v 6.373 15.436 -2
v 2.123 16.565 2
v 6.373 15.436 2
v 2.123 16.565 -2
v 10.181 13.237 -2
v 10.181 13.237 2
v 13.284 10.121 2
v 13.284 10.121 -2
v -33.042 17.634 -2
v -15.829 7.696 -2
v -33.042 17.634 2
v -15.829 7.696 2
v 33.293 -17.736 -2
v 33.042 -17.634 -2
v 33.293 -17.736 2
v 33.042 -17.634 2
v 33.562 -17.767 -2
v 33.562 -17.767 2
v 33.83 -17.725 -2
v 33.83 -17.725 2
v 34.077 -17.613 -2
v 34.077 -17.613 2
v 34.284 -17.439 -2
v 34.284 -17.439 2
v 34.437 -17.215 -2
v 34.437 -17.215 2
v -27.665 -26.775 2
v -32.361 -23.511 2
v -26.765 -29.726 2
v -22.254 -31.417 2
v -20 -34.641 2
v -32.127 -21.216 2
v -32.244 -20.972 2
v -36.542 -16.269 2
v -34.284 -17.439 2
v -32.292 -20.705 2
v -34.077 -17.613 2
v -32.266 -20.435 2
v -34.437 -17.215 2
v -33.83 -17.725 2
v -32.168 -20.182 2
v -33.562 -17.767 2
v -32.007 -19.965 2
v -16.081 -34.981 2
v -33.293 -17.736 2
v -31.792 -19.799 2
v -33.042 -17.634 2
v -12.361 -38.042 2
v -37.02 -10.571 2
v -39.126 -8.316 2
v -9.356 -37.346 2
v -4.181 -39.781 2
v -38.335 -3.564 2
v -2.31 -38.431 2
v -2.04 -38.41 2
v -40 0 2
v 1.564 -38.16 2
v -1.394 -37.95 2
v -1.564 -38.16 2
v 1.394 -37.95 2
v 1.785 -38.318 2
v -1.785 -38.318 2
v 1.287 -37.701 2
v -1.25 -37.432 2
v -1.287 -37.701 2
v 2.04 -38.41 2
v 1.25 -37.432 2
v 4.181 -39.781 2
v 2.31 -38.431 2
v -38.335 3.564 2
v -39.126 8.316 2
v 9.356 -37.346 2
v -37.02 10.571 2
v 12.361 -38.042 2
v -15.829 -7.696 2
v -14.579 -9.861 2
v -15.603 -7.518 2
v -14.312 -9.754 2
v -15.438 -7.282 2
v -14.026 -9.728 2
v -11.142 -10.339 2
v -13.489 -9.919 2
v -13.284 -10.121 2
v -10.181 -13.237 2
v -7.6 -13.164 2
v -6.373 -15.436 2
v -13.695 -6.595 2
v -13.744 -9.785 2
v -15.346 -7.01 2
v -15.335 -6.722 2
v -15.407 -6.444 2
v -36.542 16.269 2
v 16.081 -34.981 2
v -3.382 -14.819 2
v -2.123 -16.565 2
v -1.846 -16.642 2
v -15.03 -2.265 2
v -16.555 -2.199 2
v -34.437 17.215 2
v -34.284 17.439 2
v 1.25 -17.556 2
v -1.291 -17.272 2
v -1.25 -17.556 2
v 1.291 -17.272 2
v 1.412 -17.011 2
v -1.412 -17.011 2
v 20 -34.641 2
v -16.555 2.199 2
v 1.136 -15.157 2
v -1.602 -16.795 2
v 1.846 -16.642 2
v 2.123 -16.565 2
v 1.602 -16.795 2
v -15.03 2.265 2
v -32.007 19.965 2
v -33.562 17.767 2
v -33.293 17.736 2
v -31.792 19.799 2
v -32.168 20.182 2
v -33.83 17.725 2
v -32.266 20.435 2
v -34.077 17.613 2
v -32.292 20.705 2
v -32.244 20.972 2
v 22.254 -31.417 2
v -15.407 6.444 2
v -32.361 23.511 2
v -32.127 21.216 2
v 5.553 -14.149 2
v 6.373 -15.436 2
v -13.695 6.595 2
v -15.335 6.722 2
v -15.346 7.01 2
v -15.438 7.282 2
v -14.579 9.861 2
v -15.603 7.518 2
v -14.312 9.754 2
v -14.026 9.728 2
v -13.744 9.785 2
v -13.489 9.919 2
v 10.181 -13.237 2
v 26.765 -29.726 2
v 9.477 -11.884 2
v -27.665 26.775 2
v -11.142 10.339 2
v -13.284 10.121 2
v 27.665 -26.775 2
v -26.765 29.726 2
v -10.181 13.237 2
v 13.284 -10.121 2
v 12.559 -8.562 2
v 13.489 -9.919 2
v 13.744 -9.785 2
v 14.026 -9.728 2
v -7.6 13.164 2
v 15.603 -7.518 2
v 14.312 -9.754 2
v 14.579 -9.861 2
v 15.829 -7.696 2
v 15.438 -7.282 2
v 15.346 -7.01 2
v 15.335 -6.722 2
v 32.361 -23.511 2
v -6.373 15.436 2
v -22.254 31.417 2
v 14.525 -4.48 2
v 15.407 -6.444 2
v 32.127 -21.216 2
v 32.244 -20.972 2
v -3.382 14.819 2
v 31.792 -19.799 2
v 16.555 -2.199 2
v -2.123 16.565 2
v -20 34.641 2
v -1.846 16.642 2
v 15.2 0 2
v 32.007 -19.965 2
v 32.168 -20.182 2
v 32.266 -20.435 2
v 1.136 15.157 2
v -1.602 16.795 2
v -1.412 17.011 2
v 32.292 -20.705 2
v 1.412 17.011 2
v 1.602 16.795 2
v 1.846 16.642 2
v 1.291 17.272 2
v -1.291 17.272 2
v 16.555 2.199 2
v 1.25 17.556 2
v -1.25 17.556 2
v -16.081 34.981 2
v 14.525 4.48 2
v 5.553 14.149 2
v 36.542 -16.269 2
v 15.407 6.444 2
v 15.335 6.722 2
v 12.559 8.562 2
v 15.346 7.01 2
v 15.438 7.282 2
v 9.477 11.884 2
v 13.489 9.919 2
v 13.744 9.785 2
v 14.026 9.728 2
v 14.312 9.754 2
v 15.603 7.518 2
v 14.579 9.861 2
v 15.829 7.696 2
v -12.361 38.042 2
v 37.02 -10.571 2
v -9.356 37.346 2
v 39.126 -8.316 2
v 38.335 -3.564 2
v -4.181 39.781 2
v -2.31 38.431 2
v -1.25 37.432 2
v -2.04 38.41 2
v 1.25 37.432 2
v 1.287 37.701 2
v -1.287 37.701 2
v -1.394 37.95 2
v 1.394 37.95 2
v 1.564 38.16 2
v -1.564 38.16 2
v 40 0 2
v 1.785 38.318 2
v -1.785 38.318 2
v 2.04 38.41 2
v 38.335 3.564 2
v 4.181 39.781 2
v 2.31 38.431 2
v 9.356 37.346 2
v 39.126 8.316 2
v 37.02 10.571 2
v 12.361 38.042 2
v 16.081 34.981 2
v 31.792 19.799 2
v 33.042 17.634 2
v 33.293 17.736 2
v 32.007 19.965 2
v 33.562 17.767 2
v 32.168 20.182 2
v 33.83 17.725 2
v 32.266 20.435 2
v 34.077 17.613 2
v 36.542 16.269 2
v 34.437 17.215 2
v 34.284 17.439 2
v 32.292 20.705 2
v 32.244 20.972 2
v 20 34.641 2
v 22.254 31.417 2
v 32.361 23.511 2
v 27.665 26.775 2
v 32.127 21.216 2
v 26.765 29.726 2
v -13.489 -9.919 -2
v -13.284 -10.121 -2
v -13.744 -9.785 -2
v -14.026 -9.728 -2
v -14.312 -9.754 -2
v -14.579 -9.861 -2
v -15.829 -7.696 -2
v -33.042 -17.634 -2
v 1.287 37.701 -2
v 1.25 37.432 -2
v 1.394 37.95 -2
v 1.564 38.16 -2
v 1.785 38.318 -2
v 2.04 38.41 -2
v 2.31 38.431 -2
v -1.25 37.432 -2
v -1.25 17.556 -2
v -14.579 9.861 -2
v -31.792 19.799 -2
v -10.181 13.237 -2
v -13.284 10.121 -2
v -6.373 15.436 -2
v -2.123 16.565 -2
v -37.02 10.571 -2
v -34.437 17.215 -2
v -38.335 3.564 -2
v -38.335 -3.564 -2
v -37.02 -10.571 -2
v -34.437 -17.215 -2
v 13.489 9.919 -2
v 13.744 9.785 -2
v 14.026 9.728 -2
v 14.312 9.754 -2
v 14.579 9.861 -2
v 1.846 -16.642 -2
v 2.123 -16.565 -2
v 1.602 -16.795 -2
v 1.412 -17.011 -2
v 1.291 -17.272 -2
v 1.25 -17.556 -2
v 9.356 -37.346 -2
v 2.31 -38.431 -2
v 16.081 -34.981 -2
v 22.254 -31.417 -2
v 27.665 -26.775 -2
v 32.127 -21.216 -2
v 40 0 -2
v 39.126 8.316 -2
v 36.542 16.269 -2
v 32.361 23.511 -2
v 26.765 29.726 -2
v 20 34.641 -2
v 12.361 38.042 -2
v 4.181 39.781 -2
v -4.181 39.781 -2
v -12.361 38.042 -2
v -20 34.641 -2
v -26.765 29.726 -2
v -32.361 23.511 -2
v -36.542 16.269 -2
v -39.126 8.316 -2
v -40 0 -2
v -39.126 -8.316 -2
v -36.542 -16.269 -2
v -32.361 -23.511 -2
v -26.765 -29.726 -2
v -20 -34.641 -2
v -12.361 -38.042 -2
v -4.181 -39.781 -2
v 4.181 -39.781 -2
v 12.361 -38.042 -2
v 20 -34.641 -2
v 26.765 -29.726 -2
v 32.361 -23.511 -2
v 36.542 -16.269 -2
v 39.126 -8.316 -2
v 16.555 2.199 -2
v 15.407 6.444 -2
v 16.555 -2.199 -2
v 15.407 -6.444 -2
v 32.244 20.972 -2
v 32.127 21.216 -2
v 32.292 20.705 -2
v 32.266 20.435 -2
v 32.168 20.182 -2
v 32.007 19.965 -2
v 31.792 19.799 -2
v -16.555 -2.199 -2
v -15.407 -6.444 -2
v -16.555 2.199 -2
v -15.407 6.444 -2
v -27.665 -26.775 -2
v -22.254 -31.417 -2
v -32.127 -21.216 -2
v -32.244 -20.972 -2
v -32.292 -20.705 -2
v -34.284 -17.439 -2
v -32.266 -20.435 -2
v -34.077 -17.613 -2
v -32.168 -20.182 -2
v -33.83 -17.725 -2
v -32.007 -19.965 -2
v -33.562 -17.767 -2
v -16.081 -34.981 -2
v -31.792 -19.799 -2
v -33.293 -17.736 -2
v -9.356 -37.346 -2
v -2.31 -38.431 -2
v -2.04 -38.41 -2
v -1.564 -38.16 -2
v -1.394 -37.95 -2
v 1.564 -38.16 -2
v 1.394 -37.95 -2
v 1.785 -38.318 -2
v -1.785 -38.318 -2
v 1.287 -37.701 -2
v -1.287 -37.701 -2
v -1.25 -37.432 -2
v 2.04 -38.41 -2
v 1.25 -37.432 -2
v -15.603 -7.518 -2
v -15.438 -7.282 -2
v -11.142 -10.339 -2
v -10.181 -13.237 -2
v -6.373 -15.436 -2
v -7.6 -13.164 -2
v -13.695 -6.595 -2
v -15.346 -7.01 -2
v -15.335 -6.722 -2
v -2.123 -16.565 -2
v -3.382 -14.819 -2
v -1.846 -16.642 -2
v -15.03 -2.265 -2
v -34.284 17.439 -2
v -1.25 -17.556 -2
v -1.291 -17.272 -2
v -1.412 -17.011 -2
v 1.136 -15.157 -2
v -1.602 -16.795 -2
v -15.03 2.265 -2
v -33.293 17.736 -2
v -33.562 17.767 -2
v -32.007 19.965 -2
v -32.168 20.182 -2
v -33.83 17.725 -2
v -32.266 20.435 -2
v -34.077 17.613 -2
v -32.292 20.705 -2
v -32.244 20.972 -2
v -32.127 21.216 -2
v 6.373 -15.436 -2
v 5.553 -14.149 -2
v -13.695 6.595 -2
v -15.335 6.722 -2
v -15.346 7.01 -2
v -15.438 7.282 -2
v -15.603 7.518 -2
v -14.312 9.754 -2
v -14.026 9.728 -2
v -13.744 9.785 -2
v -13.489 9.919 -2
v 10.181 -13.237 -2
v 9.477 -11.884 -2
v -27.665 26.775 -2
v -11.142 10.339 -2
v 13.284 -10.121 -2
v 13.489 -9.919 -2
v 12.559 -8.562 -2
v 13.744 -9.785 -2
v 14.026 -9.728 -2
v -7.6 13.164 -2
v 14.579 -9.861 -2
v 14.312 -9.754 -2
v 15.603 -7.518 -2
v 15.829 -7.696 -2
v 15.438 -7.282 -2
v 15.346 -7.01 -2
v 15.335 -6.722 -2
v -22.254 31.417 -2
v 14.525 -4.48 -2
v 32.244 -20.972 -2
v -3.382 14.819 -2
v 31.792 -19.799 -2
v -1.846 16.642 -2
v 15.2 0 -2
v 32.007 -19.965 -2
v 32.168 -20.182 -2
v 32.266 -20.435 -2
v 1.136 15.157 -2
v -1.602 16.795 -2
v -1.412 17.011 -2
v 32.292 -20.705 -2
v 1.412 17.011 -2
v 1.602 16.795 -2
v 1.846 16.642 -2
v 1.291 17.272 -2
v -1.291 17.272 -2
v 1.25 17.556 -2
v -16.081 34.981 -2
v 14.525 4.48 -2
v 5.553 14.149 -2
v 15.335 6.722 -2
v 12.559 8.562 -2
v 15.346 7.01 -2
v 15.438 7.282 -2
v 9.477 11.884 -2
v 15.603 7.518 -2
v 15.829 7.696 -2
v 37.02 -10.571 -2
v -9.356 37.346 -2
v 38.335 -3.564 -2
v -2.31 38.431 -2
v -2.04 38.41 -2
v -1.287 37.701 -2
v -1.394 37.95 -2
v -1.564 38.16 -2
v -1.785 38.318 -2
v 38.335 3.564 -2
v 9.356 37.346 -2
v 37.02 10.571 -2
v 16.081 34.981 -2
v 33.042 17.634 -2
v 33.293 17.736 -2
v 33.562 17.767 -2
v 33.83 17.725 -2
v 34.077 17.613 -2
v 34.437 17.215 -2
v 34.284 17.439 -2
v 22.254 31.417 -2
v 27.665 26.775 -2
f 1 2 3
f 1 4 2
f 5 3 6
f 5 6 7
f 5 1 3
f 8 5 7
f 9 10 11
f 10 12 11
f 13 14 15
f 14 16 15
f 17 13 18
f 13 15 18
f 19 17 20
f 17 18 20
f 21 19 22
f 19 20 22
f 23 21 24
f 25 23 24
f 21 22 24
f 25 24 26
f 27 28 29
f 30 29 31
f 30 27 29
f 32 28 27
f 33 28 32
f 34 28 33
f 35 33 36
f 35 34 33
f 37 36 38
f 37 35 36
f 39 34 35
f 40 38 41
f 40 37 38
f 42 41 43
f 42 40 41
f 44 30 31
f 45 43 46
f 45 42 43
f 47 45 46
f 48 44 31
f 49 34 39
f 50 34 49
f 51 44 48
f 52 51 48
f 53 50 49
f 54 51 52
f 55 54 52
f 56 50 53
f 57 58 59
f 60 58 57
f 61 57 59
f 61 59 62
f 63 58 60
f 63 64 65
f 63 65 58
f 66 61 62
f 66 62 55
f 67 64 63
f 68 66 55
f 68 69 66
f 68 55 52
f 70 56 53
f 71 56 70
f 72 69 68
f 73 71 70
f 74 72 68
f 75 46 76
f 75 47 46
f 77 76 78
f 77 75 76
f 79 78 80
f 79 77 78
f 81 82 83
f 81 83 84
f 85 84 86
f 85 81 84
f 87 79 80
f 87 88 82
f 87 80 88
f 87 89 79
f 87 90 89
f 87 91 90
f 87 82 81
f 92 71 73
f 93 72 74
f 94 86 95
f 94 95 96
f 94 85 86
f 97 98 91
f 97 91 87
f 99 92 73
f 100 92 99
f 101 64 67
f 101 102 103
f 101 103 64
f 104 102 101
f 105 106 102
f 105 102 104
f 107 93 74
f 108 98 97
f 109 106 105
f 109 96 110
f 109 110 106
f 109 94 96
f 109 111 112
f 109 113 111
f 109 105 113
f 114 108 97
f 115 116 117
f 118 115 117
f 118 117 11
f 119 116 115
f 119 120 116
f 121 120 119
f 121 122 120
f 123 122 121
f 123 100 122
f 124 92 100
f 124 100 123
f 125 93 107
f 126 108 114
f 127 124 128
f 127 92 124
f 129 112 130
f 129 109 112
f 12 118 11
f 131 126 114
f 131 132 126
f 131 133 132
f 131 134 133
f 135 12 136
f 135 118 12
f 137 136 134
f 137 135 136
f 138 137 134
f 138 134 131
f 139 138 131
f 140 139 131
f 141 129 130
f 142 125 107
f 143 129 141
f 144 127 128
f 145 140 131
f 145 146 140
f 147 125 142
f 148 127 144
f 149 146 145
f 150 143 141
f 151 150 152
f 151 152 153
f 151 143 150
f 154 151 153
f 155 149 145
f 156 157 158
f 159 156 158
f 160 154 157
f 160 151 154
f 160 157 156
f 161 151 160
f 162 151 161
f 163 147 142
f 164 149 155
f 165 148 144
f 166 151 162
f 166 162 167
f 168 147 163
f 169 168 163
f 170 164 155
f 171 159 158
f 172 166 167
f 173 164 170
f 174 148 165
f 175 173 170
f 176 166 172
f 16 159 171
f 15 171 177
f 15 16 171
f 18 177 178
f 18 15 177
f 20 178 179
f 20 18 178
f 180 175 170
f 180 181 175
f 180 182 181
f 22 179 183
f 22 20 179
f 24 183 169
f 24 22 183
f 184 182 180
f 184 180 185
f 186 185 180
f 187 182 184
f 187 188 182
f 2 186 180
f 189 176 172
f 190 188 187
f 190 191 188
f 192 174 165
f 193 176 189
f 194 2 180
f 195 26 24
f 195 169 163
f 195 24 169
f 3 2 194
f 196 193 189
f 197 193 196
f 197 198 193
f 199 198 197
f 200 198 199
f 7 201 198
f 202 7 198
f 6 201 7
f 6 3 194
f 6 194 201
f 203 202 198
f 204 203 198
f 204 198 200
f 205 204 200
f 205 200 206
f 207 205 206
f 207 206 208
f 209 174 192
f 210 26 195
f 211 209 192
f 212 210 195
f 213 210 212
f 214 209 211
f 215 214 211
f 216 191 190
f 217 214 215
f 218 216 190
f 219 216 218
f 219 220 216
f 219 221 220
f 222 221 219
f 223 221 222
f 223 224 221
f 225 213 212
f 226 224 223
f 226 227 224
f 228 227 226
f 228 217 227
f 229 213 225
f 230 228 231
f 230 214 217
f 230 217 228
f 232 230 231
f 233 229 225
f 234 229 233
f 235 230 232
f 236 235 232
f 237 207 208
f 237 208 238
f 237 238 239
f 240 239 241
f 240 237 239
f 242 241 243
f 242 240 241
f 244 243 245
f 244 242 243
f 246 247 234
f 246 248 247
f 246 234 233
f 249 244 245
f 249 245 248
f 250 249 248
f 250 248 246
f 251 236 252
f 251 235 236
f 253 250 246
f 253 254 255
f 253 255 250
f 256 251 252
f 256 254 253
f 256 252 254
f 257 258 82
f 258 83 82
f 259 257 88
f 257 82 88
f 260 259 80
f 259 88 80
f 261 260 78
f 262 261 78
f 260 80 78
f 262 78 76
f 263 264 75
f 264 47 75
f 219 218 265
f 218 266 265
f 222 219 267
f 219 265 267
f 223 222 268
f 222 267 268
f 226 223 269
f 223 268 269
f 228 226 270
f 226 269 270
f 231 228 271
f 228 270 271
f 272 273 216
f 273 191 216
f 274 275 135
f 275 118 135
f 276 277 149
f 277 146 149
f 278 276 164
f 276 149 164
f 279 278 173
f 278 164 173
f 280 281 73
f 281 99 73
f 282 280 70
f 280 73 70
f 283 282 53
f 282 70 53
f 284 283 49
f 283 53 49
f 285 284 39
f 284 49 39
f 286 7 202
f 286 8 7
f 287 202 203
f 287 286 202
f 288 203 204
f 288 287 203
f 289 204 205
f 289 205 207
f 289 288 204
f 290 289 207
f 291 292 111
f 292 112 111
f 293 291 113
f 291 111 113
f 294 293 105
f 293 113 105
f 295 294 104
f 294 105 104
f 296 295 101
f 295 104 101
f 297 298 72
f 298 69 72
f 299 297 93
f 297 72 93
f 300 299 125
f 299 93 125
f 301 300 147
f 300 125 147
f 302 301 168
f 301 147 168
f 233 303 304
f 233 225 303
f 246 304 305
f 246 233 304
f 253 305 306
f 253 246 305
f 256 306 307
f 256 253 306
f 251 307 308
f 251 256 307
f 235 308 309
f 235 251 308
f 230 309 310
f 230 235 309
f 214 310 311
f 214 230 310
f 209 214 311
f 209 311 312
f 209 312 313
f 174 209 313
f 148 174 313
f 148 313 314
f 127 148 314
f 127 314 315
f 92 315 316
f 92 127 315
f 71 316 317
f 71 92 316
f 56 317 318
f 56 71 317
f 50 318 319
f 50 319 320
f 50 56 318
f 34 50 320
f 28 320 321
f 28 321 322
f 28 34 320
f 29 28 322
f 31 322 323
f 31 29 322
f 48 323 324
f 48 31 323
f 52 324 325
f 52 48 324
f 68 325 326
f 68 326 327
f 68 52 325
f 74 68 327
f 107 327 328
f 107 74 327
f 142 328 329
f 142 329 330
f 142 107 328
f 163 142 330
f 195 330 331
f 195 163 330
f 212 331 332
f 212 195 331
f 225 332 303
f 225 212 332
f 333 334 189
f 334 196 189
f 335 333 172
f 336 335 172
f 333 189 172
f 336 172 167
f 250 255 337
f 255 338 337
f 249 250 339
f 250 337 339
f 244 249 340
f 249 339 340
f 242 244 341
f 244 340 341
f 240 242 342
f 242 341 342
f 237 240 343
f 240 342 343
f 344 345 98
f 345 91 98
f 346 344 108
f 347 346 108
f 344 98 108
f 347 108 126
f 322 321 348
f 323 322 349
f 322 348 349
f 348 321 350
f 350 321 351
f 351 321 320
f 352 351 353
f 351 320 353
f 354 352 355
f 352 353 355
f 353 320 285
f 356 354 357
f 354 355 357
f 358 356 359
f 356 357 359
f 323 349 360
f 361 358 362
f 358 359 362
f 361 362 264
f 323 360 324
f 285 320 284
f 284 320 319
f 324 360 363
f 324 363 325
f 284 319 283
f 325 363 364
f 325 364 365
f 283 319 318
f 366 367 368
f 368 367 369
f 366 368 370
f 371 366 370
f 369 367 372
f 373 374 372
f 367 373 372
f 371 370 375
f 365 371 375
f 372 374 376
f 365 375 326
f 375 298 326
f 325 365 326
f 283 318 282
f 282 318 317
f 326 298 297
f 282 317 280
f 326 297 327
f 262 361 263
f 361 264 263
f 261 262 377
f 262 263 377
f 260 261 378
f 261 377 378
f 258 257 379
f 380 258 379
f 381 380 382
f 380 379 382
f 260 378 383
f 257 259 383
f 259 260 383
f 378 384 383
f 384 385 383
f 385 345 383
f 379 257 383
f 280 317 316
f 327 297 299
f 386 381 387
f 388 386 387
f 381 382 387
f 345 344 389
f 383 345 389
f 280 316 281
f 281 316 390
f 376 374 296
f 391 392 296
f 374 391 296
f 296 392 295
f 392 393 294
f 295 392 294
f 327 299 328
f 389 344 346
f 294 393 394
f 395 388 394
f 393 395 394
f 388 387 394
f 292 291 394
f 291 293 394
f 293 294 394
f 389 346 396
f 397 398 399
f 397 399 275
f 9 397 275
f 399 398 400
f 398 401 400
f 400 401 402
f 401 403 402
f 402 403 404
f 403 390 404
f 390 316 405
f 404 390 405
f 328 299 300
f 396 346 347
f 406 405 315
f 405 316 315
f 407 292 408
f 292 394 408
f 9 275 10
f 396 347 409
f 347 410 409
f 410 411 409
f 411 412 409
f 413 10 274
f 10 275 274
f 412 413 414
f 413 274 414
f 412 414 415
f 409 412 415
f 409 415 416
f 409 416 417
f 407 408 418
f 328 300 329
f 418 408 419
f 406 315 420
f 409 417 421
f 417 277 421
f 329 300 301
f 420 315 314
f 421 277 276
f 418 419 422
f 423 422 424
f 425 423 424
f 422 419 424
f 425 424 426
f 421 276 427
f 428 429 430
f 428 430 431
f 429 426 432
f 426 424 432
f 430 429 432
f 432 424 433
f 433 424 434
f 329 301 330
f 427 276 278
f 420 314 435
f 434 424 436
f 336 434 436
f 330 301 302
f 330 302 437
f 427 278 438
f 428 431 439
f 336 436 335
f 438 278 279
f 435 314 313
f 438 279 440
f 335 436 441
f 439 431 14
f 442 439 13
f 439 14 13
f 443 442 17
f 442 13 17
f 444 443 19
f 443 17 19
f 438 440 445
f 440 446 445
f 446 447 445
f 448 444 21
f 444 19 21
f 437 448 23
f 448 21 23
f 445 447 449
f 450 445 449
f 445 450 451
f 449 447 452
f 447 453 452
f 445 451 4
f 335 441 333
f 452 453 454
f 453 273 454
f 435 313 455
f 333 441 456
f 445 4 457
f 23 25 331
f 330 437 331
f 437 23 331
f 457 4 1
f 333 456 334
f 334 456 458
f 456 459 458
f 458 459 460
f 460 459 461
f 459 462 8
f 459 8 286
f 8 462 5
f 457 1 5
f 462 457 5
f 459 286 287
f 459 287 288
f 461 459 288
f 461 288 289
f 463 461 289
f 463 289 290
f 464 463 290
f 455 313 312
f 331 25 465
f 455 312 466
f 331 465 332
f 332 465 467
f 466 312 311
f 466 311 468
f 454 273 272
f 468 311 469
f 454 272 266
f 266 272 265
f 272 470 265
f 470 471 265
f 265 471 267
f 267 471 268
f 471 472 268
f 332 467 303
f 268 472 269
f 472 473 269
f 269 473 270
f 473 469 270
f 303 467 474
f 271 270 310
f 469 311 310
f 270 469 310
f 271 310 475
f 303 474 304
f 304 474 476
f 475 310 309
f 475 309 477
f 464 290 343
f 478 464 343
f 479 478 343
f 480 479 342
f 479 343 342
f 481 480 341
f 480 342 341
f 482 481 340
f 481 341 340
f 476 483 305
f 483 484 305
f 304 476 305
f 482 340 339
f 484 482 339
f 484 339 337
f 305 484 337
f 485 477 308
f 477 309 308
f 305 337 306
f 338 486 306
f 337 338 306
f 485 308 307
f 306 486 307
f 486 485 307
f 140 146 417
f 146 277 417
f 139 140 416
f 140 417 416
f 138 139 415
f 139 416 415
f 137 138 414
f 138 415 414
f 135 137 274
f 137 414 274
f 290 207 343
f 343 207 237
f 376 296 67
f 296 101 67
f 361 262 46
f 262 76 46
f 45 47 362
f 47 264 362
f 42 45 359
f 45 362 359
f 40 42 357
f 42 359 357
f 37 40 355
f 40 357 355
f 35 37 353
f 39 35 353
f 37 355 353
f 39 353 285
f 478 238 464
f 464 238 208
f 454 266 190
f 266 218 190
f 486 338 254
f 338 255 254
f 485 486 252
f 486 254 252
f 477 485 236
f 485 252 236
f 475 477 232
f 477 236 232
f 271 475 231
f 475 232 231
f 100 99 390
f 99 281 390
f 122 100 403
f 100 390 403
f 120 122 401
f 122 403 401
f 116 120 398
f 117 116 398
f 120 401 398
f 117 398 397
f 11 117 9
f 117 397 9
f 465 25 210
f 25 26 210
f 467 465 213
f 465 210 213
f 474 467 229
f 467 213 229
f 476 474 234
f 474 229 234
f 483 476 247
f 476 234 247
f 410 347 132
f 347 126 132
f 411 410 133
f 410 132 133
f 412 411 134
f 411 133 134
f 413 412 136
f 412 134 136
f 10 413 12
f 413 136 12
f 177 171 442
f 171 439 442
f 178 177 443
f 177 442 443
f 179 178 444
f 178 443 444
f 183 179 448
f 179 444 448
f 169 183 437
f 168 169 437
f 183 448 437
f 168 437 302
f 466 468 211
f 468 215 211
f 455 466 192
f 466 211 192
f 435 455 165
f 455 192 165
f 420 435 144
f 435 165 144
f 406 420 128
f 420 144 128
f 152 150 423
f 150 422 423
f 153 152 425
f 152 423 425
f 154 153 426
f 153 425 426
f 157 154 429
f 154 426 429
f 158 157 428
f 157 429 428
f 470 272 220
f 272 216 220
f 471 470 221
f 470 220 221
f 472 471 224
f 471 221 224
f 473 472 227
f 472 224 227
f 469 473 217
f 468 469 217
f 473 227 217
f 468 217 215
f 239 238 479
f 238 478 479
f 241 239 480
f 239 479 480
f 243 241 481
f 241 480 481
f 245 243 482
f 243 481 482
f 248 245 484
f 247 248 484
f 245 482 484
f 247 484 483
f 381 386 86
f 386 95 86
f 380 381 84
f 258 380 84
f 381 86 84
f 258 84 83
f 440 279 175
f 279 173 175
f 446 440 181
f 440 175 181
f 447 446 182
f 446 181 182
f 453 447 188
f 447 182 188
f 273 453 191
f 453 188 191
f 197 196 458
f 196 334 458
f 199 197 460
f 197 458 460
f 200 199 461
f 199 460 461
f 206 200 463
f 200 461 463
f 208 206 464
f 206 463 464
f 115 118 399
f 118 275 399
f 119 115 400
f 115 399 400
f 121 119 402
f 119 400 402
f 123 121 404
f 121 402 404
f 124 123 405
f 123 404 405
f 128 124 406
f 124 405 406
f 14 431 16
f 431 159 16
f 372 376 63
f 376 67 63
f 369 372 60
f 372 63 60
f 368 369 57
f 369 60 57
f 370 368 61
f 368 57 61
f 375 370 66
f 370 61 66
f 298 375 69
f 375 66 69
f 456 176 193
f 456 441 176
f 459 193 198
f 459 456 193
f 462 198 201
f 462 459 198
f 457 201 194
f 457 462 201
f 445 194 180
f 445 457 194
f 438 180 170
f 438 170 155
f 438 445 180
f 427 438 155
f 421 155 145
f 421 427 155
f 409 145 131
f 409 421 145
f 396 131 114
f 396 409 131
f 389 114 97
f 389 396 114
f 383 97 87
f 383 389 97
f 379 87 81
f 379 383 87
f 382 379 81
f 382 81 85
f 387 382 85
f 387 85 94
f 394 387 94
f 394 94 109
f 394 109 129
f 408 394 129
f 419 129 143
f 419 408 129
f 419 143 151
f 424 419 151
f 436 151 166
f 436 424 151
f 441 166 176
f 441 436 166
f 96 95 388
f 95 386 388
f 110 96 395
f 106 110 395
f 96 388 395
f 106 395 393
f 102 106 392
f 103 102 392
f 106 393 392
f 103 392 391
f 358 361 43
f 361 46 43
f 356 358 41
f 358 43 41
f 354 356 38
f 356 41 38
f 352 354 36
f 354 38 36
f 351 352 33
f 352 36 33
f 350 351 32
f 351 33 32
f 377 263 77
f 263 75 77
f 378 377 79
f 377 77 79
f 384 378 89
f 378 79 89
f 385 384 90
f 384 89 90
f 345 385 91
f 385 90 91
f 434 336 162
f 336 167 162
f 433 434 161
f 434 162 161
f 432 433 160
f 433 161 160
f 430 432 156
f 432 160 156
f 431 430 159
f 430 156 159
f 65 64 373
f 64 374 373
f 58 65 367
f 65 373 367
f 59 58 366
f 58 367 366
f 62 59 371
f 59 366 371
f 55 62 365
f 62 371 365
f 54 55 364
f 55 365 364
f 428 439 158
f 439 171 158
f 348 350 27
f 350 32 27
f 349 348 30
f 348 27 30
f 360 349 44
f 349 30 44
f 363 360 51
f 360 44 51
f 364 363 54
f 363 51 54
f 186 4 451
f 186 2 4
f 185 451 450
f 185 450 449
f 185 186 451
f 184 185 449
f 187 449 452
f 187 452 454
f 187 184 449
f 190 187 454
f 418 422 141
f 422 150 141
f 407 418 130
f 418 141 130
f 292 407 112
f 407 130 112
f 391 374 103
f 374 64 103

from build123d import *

# Parameters (mm, degrees)
SKETCH1_R           = 40
SKETCH1_R_2         = 15.2
BOSS_EXTRUDE1_DEPTH = 2
FILLET2_R           = 1


with BuildPart() as part:
    # Sketch1 → Boss-Extrude1 (new, symmetric)
    with BuildSketch(Plane.XY):
        Circle(SKETCH1_R)
        Circle(SKETCH1_R_2, mode=Mode.SUBTRACT)
        with BuildLine():
            ThreePointArc((1.25, -38.479702442), (19.25, -33.341978046), (32.699399845, -20.322382976))
            Line((32.699399845, -20.322382976), (13.797053425, -9.409108182))
            ThreePointArc((13.797053425, -9.409108182), (8.35, -14.462624243), (1.25, -16.653152855))
            Line((1.25, -16.653152855), (1.25, -38.479702442))
        make_face(mode=Mode.SUBTRACT)
        with BuildLine():
            ThreePointArc((33.949399845, -18.157319466), (38.5, 0), (33.949399845, 18.157319466))
            Line((33.949399845, 18.157319466), (15.047053425, 7.244044673))
            ThreePointArc((15.047053425, 7.244044673), (16.7, 0), (15.047053425, -7.244044673))
            Line((15.047053425, -7.244044673), (33.949399845, -18.157319466))
        make_face(mode=Mode.SUBTRACT)
        with BuildLine():
            ThreePointArc((-1.25, 38.479702442), (-19.25, 33.341978046), (-32.699399845, 20.322382976))
            Line((-32.699399845, 20.322382976), (-13.797053425, 9.409108182))
            ThreePointArc((-13.797053425, 9.409108182), (-8.35, 14.462624243), (-1.25, 16.653152855))
            Line((-1.25, 16.653152855), (-1.25, 38.479702442))
        make_face(mode=Mode.SUBTRACT)
        with BuildLine():
            ThreePointArc((-32.699399845, -20.322382976), (-19.25, -33.341978046), (-1.25, -38.479702442))
            Line((-1.25, -38.479702442), (-1.25, -16.653152855))
            ThreePointArc((-1.25, -16.653152855), (-8.35, -14.462624243), (-13.797053425, -9.409108182))
            Line((-13.797053425, -9.409108182), (-32.699399845, -20.322382976))
        make_face(mode=Mode.SUBTRACT)
        with BuildLine():
            Line((-15.047053425, 7.244044673), (-33.949399845, 18.157319466))
            ThreePointArc((-33.949399845, 18.157319466), (-38.5, 0), (-33.949399845, -18.157319466))
            Line((-33.949399845, -18.157319466), (-15.047053425, -7.244044673))
            ThreePointArc((-15.047053425, -7.244044673), (-16.7, 0), (-15.047053425, 7.244044673))
        make_face(mode=Mode.SUBTRACT)
        with BuildLine():
            Line((13.797053425, 9.409108182), (32.699399845, 20.322382976))
            ThreePointArc((32.699399845, 20.322382976), (19.25, 33.341978046), (1.25, 38.479702442))
            Line((1.25, 38.479702442), (1.25, 16.653152855))
            ThreePointArc((1.25, 16.653152855), (8.35, 14.462624243), (13.797053425, 9.409108182))
        make_face(mode=Mode.SUBTRACT)
    extrude(amount=BOSS_EXTRUDE1_DEPTH, both=True)

    # Fillet2
    fillet2_edges = [part.edges().sort_by_distance(p)[0] for p in [
        (32.699399845, 20.322382976, 0),
        (1.25, 38.479702442, 0),
        (1.25, 16.653152855, 0),
        (13.797053425, 9.409108182, 0),
        (-33.949399845, 18.157319466, 0),
        (-33.949399845, -18.157319466, 0),
        (-15.047053425, -7.244044673, 0),
        (-15.047053425, 7.244044673, 0),
        (-1.25, -38.479702442, 0),
        (-1.25, -16.653152855, 0),
        (-13.797053425, -9.409108182, 0),
        (-32.699399845, -20.322382976, 0),
        (-32.699399845, 20.322382976, 0),
        (-13.797053425, 9.409108182, 0),
        (-1.25, 16.653152855, 0),
        (-1.25, 38.479702442, 0),
        (33.949399845, 18.157319466, 0),
        (15.047053425, 7.244044673, 0),
        (15.047053425, -7.244044673, 0),
        (33.949399845, -18.157319466, 0),
        (32.699399845, -20.322382976, 0),
        (13.797053425, -9.409108182, 0),
        (1.25, -16.653152855, 0),
        (1.25, -38.479702442, 0),
    ]]
    fillet(fillet2_edges, radius=FILLET2_R)


solid = part.part
